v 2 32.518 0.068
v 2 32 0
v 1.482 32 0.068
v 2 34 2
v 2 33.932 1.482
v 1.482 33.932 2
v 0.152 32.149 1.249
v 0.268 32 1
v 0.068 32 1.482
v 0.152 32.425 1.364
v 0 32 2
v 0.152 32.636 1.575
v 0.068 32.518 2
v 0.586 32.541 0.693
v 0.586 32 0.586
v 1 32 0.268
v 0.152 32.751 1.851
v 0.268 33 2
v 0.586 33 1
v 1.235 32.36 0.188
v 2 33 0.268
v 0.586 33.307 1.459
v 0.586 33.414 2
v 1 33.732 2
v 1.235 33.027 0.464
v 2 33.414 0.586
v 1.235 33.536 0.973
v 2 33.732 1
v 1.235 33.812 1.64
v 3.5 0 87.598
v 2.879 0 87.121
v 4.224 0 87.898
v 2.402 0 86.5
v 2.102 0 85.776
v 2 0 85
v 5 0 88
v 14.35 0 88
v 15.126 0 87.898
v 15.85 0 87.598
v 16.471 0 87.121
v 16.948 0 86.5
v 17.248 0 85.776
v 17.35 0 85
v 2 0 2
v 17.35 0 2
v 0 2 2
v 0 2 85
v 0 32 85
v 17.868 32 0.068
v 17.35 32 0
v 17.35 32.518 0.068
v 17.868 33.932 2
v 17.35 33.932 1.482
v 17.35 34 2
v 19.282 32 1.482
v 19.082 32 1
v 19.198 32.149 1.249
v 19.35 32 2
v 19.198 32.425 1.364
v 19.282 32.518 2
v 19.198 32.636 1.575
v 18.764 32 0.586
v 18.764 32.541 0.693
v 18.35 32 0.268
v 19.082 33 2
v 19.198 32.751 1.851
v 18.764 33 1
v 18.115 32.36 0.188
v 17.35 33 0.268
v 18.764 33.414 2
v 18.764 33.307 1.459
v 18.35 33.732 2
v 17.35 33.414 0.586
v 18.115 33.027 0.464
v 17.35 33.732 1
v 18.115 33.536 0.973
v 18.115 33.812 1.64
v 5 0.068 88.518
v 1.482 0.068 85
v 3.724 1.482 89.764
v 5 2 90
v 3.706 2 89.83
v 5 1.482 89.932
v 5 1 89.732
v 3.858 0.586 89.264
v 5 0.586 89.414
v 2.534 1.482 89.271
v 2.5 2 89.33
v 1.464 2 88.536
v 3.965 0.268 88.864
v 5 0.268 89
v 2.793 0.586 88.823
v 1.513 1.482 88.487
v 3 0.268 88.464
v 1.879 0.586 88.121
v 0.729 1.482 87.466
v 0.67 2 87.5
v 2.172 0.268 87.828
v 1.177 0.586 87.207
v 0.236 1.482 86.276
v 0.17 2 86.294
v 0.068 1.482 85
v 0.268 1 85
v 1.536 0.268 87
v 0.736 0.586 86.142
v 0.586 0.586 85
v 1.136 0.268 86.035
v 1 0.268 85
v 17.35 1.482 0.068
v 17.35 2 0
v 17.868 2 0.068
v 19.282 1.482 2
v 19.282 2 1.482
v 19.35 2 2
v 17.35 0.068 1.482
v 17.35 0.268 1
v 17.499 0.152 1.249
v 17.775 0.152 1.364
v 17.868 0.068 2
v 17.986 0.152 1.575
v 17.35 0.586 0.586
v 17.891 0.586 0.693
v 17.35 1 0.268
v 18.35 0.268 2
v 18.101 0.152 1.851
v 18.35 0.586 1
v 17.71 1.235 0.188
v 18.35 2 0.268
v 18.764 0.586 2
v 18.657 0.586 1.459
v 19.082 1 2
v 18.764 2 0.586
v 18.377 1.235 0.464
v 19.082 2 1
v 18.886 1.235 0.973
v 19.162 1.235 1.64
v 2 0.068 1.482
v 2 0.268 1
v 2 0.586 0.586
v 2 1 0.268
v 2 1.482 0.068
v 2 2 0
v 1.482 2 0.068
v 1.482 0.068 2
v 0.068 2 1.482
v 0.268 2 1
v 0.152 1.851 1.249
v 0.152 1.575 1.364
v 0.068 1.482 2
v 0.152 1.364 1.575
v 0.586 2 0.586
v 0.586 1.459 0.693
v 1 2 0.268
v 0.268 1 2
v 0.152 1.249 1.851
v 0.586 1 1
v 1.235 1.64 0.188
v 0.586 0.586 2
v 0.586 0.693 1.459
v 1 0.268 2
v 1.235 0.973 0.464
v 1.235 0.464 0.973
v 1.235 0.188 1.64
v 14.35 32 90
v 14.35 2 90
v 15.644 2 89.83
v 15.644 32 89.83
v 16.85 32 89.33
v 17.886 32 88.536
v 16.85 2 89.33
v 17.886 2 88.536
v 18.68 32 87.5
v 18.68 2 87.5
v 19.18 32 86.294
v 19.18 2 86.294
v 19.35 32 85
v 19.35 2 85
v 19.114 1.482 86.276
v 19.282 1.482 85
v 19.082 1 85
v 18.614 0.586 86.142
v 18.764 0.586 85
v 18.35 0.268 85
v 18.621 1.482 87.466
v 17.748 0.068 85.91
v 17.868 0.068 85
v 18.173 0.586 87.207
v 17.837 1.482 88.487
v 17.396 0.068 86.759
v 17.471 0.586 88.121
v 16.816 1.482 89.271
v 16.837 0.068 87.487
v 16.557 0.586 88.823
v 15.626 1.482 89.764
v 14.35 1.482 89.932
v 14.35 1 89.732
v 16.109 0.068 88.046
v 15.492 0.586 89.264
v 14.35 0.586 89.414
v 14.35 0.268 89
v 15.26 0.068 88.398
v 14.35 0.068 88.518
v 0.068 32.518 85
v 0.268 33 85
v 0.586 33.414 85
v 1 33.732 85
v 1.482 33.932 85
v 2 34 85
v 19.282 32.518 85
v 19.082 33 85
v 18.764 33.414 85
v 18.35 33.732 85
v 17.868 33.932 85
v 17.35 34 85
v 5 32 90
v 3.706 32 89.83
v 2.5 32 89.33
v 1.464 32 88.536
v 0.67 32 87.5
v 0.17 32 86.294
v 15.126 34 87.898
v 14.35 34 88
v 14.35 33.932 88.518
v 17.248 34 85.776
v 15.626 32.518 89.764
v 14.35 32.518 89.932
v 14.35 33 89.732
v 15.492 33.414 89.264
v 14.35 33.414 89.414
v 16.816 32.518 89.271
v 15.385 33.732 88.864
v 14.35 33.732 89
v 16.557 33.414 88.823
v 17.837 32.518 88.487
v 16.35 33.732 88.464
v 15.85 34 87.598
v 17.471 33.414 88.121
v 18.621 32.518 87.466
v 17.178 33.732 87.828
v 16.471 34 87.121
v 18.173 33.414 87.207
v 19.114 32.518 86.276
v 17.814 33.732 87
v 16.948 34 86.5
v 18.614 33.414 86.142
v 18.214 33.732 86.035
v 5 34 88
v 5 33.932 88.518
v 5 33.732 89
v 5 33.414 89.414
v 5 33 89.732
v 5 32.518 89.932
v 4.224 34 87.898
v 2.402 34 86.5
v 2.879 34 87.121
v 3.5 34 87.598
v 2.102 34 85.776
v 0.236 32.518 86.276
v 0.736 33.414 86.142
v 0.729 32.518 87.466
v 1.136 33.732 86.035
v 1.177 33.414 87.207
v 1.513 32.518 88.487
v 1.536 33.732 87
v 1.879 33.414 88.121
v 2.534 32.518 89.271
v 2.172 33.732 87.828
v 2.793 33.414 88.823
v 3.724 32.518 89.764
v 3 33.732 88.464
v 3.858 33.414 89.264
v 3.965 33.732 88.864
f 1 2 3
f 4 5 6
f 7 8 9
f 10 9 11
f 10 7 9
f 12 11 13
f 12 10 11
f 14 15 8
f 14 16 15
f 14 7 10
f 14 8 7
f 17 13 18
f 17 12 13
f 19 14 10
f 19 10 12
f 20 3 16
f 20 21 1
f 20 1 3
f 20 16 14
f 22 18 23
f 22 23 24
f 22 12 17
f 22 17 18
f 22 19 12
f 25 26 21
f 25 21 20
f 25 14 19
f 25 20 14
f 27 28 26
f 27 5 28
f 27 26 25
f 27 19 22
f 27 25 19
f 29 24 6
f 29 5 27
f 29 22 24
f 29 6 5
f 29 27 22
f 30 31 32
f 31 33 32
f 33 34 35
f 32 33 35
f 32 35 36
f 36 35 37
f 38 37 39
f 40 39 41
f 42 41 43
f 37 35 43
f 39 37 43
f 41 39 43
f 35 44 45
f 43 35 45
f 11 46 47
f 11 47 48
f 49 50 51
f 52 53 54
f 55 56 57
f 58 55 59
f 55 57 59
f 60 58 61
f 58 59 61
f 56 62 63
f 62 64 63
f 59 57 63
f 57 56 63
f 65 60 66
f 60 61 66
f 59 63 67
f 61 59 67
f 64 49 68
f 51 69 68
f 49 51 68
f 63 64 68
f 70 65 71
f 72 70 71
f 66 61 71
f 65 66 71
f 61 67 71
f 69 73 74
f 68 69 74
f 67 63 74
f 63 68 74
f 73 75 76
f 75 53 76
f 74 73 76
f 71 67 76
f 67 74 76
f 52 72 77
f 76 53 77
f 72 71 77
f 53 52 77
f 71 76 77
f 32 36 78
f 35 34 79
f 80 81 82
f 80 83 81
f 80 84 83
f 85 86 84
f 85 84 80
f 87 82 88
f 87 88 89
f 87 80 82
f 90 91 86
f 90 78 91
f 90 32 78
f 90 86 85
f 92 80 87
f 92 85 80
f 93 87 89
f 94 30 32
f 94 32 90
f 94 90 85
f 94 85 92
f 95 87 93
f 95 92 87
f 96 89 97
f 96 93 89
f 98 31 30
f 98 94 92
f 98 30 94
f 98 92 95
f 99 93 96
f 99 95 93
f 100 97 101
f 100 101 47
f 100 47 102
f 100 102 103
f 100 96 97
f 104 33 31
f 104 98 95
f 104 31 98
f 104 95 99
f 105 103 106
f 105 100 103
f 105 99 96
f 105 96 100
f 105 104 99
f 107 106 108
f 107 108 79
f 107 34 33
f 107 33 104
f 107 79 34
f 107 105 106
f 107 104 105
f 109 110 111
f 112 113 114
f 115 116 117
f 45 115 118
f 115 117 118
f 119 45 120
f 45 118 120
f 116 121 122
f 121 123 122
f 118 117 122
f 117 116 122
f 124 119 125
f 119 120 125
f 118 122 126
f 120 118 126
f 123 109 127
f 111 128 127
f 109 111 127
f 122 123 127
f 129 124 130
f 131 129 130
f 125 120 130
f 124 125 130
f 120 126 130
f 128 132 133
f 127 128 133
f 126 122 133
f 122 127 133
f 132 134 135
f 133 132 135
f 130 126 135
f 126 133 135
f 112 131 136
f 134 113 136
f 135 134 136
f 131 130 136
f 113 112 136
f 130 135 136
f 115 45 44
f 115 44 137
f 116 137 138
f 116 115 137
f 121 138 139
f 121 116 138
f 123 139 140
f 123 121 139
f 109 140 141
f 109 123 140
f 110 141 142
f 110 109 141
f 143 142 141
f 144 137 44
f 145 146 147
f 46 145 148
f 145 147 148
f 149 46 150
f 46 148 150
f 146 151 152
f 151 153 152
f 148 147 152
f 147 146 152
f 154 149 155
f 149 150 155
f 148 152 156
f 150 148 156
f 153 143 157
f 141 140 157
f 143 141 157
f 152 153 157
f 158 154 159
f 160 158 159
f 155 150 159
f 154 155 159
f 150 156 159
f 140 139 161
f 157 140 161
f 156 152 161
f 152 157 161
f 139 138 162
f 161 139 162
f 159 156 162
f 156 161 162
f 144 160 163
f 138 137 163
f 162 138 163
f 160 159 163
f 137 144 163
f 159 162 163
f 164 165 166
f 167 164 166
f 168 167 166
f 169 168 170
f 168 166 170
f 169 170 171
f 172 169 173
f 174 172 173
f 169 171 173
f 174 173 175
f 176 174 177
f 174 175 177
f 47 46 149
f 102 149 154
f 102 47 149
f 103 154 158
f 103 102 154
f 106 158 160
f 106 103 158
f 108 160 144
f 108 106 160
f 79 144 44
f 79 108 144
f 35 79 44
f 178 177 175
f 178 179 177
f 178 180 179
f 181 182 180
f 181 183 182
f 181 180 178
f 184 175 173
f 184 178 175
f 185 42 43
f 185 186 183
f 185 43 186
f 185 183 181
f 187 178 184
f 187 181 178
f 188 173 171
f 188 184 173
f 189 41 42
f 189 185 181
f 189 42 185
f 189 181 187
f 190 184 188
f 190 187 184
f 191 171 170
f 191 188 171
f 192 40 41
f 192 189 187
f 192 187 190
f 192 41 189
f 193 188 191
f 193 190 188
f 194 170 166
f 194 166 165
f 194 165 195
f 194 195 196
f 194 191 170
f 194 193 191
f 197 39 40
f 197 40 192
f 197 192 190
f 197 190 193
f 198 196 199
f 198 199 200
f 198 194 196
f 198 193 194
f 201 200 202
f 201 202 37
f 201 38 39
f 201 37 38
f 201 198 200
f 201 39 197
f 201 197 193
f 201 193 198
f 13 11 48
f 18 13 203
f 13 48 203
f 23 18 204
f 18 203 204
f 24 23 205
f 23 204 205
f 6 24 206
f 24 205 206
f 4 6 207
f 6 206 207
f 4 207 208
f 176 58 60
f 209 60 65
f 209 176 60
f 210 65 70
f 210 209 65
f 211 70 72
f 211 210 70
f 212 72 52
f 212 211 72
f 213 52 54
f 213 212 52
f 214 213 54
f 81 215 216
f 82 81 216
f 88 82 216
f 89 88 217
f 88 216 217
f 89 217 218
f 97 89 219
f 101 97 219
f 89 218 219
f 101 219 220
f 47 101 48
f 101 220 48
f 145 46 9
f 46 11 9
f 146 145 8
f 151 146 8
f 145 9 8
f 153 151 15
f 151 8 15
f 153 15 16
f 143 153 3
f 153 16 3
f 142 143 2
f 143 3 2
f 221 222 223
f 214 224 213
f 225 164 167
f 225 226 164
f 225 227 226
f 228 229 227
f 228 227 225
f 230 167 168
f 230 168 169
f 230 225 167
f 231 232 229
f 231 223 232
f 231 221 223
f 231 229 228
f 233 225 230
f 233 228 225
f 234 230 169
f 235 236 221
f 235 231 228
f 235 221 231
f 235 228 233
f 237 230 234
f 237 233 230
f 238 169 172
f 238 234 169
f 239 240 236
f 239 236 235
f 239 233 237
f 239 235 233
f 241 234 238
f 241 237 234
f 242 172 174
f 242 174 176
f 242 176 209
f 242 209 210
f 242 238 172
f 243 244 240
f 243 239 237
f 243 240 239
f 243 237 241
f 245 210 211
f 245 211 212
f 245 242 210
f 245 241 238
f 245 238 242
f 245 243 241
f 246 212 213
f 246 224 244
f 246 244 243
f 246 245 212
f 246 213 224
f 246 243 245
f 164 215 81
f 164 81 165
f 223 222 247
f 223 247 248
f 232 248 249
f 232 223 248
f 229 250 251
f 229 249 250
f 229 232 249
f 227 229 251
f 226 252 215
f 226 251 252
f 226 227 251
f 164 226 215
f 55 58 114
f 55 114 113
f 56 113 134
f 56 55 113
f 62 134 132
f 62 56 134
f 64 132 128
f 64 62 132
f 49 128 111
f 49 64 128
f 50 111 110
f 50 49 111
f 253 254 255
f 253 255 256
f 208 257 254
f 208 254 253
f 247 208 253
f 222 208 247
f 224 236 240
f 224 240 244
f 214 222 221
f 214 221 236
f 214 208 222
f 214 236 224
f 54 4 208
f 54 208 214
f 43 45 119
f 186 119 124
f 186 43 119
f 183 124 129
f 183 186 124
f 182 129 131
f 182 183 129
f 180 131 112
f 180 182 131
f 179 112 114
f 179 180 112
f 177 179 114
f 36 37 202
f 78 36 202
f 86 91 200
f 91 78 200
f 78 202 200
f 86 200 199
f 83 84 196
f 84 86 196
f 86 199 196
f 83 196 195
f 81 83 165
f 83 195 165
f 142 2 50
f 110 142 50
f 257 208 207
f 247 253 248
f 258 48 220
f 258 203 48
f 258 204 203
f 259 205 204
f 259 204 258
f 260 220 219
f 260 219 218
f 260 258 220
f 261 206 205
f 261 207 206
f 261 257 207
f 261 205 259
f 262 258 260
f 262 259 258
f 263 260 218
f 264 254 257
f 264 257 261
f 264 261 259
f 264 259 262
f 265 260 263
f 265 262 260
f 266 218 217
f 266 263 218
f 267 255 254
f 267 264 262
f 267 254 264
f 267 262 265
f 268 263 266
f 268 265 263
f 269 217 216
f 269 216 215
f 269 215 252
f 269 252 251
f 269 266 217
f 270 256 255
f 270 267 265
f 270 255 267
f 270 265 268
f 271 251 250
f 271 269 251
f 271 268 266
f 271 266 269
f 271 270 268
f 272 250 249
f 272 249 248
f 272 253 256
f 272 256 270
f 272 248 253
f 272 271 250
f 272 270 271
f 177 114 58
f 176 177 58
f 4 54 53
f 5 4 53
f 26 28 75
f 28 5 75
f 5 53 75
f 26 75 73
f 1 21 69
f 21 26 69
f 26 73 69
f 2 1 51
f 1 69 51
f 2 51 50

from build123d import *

# Parameters (mm, degrees)
ESQUISSE1_W        = 19.35
ESQUISSE1_H        = 34
BOSS_EXTRU_1_DEPTH = 90
CONG_1_R           = 2
CONG_2_R           = 5


with BuildPart() as part:
    # Esquisse1 → Boss.-Extru.1 (new body)
    with BuildSketch(Plane.XY):
        with Locations((9.675, 17)):
            Rectangle(ESQUISSE1_W, ESQUISSE1_H)
    extrude(amount=BOSS_EXTRU_1_DEPTH)

    # Congé1
    cong_1_edges = [part.edges().sort_by_distance(p)[0] for p in [
        (9.675, 34, 90),
        (9.675, 34, 0),
        (19.35, 17, 0),
        (9.675, 0, 0),
        (0, 17, 0),
        (9.675, 0, 90),
        (0, 34, 45),
        (19.35, 34, 45),
        (19.35, 0, 45),
        (0, 0, 45),
    ]]
    fillet(cong_1_edges, radius=CONG_1_R)

    # Congé2
    # the kernel refuses this fillet: 5 mm, written as the material it takes off along each edge
    with BuildSketch(Plane(origin=(14.35, 0, 85), x_dir=(1, 0, 0), z_dir=(0, 0, -1))) as cong_2_piece_1:
        with BuildLine():
            CenterArc((3, -2), 2, 0, 90)
            Line((5, -2), (5, 0))
            Line((5, 0), (3, 0))
        make_face()
    revolve(axis=Axis((14.35, 0, 85), (0, -1, 0)), revolution_arc=90, mode=Mode.SUBTRACT)
    with BuildSketch(Plane(origin=(5, 0, 85), x_dir=(0, 0, 1), z_dir=(1, 0, 0))) as cong_2_piece_2:
        with BuildLine():
            CenterArc((3, -2), 2, 0, 90)
            Line((5, -2), (5, 0))
            Line((5, 0), (3, 0))
        make_face()
    revolve(axis=Axis((5, 0, 85), (0, -1, 0)), revolution_arc=90, mode=Mode.SUBTRACT)
    with BuildSketch(Plane(origin=(14.35, 34, 85), x_dir=(0, 0, 1), z_dir=(-1, 0, 0))) as cong_2_piece_3:
        with BuildLine():
            CenterArc((3, -2), 2, 0, 90)
            Line((5, -2), (5, 0))
            Line((5, 0), (3, 0))
        make_face()
    revolve(axis=Axis((14.35, 34, 85), (0, 1, 0)), revolution_arc=90, mode=Mode.SUBTRACT)
    with BuildSketch(Plane(origin=(5, 34, 85), x_dir=(-1, 0, 0), z_dir=(0, 0, -1))) as cong_2_piece_4:
        with BuildLine():
            CenterArc((3, -2), 2, 0, 90)
            Line((5, -2), (5, 0))
            Line((5, 0), (3, 0))
        make_face()
    revolve(axis=Axis((5, 34, 85), (0, 1, 0)), revolution_arc=90, mode=Mode.SUBTRACT)
    with BuildSketch(Plane(origin=(0, 34, 90), x_dir=(0, 0, -1), z_dir=(0, -1, 0)), Plane(origin=(19.35, 0, 90), x_dir=(0, 0, -1), z_dir=(0, 1, 0))) as cong_2_piece_5:
        with BuildLine():
            CenterArc((CONG_2_R, CONG_2_R), CONG_2_R, 180, 90)
            Line((0, CONG_2_R), (0, 0))
            Line((0, 0), (CONG_2_R, 0))
        make_face()
    extrude(amount=34, mode=Mode.SUBTRACT)


solid = part.part
